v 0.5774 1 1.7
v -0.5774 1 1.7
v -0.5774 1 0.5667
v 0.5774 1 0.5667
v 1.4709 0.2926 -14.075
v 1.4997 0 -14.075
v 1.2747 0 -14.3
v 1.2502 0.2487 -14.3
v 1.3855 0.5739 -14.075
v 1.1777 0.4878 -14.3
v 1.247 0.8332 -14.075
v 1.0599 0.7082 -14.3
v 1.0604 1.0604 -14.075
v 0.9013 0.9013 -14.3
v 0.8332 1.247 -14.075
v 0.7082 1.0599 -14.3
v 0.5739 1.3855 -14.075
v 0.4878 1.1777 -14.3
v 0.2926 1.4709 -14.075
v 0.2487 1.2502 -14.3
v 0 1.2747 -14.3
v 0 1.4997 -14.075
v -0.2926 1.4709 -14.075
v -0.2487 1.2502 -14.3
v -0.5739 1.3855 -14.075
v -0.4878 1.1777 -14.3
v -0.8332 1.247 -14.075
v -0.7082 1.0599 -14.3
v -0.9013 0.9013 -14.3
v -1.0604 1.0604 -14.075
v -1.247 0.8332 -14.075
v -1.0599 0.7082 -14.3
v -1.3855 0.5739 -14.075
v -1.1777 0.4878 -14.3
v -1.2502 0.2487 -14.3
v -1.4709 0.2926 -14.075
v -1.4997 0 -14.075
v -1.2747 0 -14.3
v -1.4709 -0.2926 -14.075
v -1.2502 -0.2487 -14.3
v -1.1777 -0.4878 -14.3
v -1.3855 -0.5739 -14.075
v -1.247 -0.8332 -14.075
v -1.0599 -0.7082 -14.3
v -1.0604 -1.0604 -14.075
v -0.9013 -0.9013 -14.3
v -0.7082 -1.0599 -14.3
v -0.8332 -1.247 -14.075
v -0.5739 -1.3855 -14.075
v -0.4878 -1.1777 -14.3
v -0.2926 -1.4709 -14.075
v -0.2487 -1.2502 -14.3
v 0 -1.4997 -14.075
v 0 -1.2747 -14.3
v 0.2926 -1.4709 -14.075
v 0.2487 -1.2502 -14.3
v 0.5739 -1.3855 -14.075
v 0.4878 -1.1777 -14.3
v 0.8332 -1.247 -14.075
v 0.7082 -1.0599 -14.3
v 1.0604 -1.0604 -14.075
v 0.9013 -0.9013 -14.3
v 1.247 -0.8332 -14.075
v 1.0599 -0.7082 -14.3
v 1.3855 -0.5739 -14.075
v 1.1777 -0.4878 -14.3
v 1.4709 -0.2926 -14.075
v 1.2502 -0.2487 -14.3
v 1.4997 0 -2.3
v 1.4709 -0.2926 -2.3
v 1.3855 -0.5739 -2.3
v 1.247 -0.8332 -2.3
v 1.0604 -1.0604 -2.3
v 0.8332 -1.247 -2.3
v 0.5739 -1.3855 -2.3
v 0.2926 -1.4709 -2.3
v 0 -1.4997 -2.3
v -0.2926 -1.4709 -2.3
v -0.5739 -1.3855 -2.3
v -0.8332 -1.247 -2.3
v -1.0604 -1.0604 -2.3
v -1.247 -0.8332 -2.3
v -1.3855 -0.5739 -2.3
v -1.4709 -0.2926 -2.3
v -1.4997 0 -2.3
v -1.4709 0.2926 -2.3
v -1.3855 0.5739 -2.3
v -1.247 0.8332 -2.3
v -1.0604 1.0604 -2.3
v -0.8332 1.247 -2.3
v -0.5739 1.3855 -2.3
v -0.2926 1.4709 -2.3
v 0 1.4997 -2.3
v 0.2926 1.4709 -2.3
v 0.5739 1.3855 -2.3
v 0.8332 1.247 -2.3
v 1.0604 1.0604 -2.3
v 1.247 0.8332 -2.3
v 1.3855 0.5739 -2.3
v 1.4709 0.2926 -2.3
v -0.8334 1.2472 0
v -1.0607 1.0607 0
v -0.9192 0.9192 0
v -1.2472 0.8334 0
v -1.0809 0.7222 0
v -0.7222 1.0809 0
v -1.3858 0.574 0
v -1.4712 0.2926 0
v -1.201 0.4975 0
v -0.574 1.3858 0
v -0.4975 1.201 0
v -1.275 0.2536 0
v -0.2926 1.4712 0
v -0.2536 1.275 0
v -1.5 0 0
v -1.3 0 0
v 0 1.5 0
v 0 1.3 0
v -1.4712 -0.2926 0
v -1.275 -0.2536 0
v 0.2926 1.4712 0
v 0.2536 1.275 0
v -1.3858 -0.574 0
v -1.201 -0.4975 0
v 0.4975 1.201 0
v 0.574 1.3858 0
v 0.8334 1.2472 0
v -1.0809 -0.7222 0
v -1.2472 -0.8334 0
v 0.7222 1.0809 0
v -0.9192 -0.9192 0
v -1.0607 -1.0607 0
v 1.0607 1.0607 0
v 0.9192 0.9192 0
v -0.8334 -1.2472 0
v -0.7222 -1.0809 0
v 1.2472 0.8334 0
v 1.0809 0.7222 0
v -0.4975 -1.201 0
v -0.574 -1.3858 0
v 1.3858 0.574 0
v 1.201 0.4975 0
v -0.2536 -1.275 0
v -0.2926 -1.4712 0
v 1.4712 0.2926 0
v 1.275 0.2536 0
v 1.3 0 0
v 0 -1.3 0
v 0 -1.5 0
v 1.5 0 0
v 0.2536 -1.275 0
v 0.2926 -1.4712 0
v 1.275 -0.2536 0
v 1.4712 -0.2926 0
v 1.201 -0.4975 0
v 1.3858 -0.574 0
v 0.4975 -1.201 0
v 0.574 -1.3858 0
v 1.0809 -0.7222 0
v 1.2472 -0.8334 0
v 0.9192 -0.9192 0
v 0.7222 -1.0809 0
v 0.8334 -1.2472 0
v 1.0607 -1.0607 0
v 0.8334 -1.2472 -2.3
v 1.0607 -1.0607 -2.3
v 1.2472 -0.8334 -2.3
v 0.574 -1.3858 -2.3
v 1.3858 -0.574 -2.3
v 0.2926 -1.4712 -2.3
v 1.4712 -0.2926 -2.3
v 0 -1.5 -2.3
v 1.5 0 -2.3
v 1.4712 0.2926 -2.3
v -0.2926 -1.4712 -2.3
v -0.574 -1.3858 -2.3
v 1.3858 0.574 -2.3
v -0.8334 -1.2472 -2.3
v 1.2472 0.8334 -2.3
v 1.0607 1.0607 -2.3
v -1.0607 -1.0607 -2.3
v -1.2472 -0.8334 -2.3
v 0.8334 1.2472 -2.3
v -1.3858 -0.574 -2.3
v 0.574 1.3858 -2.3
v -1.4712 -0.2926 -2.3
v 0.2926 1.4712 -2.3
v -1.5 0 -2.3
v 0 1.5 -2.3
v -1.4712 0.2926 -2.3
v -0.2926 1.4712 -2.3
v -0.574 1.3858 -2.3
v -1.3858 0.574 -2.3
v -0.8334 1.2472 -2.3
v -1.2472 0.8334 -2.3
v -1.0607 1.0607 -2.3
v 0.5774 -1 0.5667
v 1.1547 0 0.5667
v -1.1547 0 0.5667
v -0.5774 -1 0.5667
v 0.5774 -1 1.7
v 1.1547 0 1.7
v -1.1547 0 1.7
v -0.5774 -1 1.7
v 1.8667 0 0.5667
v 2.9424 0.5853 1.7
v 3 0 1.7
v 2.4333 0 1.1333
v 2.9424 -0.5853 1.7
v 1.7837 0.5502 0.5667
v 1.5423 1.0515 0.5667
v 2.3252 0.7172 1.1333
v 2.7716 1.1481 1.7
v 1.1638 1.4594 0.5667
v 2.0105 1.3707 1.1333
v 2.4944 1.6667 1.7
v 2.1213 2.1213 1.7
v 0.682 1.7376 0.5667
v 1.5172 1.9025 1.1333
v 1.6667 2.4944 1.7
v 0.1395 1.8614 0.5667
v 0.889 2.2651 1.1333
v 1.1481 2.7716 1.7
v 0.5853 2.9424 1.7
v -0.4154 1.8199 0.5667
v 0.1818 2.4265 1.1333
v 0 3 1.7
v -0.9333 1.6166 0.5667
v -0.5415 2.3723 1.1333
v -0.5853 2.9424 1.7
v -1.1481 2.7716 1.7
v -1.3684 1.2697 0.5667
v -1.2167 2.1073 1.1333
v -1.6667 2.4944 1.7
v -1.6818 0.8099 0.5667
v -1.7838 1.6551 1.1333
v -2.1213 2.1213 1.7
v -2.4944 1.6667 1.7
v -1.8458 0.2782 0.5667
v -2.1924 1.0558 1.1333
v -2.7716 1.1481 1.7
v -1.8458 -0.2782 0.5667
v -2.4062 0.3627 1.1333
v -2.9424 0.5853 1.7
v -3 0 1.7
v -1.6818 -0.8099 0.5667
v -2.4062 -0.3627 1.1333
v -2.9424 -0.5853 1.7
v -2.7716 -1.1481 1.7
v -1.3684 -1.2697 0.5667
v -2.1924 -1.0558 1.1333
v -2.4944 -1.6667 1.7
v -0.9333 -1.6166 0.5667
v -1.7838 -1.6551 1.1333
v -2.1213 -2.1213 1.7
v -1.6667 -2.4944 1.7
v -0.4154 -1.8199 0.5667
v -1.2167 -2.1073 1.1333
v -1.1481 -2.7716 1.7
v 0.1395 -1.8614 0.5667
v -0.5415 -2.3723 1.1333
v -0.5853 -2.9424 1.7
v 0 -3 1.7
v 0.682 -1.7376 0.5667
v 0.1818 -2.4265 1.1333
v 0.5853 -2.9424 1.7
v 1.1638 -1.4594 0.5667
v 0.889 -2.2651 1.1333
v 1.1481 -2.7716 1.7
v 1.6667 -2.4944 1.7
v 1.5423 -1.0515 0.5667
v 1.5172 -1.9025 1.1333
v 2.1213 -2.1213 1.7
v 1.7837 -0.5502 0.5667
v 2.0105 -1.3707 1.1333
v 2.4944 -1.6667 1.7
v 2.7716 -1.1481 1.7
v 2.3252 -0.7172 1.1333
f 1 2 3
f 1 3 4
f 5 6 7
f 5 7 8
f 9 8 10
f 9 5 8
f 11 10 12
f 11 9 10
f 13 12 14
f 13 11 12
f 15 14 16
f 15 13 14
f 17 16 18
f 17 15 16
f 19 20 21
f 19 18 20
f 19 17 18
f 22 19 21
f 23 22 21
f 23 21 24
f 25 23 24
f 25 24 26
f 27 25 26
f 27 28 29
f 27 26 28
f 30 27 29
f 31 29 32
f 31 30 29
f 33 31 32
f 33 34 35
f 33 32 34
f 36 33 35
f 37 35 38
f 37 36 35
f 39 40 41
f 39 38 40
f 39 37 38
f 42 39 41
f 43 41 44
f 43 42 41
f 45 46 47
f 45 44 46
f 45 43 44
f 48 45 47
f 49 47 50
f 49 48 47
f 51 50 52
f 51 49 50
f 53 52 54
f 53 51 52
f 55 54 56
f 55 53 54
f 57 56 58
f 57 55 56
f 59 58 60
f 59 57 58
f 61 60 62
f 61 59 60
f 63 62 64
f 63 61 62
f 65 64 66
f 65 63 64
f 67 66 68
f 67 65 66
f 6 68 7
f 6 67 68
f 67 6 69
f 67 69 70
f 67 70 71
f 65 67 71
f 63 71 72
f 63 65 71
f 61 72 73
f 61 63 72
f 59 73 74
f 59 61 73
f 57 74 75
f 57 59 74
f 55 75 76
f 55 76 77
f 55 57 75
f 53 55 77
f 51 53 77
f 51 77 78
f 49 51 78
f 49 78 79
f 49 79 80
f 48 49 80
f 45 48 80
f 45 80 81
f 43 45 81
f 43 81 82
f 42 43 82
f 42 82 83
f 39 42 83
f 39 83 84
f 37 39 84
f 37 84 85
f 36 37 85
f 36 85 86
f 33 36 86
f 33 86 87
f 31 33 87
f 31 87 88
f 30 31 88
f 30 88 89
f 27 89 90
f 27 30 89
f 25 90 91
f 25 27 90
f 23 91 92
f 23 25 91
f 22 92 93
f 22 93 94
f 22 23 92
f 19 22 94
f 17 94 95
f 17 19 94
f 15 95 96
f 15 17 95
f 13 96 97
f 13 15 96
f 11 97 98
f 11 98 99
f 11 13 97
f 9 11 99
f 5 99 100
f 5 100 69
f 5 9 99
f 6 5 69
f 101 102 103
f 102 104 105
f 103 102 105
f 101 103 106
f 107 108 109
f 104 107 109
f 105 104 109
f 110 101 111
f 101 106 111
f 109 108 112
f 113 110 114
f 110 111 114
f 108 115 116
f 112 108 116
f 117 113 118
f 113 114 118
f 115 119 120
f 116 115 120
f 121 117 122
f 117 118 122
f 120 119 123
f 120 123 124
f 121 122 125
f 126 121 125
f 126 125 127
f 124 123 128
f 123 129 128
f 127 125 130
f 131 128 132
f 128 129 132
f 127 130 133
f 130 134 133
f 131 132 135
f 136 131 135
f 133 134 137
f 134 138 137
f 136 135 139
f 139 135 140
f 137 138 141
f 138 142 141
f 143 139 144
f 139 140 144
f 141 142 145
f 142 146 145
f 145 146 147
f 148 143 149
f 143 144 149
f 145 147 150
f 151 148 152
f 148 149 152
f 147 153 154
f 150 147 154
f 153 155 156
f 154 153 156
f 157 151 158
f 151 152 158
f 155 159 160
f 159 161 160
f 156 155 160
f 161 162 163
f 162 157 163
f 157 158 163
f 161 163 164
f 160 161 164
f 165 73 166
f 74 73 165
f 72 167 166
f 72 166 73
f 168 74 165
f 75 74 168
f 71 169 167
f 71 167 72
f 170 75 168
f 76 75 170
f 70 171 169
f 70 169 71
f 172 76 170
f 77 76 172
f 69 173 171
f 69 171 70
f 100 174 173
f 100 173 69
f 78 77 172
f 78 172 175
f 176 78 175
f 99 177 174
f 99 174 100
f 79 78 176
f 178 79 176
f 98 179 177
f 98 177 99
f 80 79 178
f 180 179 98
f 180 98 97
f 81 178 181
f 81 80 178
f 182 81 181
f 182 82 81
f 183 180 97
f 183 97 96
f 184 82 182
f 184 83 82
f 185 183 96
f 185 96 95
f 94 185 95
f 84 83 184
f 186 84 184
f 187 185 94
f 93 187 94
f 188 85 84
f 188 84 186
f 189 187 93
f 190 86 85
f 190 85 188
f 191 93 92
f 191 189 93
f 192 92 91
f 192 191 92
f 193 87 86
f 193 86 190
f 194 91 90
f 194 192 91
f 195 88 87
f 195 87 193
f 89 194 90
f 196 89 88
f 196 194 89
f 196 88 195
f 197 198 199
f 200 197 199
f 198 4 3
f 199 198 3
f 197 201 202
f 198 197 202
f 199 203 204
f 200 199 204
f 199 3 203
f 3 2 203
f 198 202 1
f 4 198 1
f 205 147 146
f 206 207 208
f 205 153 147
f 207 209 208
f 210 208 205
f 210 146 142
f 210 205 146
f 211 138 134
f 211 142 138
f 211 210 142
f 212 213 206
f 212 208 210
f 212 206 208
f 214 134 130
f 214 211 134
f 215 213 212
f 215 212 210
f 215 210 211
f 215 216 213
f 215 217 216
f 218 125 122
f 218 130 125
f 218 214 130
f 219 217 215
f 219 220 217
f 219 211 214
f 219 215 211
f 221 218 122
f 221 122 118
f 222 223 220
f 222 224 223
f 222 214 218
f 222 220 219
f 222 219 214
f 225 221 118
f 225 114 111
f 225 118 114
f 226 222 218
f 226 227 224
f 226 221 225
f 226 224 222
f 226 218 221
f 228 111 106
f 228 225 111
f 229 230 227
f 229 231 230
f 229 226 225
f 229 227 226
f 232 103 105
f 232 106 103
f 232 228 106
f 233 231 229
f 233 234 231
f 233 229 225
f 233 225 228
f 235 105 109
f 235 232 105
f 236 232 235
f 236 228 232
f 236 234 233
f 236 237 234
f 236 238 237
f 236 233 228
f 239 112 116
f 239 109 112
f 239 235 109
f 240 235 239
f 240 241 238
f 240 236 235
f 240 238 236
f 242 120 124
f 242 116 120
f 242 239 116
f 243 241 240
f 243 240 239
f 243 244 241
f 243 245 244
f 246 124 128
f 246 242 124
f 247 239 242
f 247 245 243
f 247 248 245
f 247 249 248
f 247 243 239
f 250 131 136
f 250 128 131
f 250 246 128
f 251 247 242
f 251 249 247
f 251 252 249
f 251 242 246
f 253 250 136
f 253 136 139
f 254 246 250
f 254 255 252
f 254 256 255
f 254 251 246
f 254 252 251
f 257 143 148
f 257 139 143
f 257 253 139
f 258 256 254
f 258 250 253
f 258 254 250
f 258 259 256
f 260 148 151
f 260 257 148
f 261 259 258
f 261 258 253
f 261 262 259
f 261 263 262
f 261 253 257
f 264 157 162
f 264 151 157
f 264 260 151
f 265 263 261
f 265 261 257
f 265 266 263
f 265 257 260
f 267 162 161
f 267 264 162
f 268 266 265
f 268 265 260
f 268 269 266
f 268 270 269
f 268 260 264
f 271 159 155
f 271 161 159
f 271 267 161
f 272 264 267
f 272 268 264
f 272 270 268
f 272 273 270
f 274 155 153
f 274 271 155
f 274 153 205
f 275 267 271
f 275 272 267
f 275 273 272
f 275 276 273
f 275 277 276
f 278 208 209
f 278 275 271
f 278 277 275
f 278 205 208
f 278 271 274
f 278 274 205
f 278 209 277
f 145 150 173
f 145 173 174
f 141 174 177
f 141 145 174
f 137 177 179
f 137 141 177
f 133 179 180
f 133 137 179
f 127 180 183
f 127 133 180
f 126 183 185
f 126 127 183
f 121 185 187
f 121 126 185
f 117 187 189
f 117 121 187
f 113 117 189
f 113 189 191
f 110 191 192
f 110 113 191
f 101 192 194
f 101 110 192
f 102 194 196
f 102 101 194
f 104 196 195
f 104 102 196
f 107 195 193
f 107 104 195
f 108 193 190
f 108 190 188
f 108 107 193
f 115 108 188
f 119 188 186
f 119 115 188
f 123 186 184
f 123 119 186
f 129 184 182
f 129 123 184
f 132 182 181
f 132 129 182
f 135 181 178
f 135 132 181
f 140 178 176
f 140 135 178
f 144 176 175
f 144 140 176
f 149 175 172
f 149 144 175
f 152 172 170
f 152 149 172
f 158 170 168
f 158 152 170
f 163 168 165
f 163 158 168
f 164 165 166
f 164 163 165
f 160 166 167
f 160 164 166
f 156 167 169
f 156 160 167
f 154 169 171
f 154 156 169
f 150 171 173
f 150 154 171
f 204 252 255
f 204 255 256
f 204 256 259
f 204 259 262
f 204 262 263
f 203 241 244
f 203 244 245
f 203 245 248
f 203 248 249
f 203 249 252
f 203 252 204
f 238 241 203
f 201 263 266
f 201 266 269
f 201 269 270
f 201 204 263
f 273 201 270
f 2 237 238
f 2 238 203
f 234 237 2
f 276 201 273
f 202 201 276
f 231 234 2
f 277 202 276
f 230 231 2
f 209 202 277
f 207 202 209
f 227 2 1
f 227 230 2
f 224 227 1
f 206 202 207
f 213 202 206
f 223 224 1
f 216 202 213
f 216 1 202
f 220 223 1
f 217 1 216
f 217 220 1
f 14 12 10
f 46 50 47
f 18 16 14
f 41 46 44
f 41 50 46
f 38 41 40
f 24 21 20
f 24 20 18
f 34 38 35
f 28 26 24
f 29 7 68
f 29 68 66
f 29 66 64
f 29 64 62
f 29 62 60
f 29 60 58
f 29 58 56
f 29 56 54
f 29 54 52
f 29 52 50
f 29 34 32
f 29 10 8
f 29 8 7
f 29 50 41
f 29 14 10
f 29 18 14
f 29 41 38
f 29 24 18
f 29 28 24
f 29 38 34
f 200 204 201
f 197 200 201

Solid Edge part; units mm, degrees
sketch "Sketch1" plane through (0, 0, 0) normal (0, 0, 1) x (1, 0, 0)
  circle A0 centre (0, 0) radius 3
  dimension "D1" = 6
extrude "Protrusion1" add sketch "Sketch1" along normal blind 1.7
sketch "Sketch2" plane through (0, 0, 0) normal (0, 0, -1) x (1, 0, 0)
  circle A0 centre (0, 0) radius 1.5
extrude "Protrusion2" add sketch "Sketch2" along normal blind 14.3
sketch "Sketch3" plane through (0, 0, -14.3) normal (0, 0, -1) x (1, 0, 0)
  circle A0 centre (0, 0) radius 1.4997
extrude "Cutout1" cut sketch "Sketch3" against normal blind 12 flip side to cut
chamfer "Chamfer_1" distance 0.225 angle 45 1 edges at (-1.4997, 0, -14.3)
sketch "Sketch4" plane through (0, 0, 1.7) normal (0, 0, 1) x (1, 0, 0)
  line L0 (-0.5774, 1) -> (0.5774, 1)
  line L1 (1.1547, 0) -> (0.5774, 1)
  line L2 (0.5774, -1) -> (1.1547, 0)
  line L3 (-0.5774, -1) -> (0.5774, -1)
  line L4 (-1.1547, 0) -> (-0.5774, -1)
  line L5 (-0.5774, 1) -> (-1.1547, 0)
  dimension "D1" = 2
extrude "Cutout2" cut sketch "Sketch4" against normal blind 1.1333
sketch "Sketch5" plane through (0, 0, 0) normal (0, -1, 0) x (1, 0, 0)
  line L0 (3, 1.7) -> (1.3, 0)
  line L1 (1.3, 0) -> (3, 0)
  line L2 (3, 0) -> (3, 1.7)
revolve "RevolvedCutout1" cut sketch "Sketch5" angle 360 about axis through (0, 0, 14.0017) along (0, 0, -1)
properties part number "24104634"
